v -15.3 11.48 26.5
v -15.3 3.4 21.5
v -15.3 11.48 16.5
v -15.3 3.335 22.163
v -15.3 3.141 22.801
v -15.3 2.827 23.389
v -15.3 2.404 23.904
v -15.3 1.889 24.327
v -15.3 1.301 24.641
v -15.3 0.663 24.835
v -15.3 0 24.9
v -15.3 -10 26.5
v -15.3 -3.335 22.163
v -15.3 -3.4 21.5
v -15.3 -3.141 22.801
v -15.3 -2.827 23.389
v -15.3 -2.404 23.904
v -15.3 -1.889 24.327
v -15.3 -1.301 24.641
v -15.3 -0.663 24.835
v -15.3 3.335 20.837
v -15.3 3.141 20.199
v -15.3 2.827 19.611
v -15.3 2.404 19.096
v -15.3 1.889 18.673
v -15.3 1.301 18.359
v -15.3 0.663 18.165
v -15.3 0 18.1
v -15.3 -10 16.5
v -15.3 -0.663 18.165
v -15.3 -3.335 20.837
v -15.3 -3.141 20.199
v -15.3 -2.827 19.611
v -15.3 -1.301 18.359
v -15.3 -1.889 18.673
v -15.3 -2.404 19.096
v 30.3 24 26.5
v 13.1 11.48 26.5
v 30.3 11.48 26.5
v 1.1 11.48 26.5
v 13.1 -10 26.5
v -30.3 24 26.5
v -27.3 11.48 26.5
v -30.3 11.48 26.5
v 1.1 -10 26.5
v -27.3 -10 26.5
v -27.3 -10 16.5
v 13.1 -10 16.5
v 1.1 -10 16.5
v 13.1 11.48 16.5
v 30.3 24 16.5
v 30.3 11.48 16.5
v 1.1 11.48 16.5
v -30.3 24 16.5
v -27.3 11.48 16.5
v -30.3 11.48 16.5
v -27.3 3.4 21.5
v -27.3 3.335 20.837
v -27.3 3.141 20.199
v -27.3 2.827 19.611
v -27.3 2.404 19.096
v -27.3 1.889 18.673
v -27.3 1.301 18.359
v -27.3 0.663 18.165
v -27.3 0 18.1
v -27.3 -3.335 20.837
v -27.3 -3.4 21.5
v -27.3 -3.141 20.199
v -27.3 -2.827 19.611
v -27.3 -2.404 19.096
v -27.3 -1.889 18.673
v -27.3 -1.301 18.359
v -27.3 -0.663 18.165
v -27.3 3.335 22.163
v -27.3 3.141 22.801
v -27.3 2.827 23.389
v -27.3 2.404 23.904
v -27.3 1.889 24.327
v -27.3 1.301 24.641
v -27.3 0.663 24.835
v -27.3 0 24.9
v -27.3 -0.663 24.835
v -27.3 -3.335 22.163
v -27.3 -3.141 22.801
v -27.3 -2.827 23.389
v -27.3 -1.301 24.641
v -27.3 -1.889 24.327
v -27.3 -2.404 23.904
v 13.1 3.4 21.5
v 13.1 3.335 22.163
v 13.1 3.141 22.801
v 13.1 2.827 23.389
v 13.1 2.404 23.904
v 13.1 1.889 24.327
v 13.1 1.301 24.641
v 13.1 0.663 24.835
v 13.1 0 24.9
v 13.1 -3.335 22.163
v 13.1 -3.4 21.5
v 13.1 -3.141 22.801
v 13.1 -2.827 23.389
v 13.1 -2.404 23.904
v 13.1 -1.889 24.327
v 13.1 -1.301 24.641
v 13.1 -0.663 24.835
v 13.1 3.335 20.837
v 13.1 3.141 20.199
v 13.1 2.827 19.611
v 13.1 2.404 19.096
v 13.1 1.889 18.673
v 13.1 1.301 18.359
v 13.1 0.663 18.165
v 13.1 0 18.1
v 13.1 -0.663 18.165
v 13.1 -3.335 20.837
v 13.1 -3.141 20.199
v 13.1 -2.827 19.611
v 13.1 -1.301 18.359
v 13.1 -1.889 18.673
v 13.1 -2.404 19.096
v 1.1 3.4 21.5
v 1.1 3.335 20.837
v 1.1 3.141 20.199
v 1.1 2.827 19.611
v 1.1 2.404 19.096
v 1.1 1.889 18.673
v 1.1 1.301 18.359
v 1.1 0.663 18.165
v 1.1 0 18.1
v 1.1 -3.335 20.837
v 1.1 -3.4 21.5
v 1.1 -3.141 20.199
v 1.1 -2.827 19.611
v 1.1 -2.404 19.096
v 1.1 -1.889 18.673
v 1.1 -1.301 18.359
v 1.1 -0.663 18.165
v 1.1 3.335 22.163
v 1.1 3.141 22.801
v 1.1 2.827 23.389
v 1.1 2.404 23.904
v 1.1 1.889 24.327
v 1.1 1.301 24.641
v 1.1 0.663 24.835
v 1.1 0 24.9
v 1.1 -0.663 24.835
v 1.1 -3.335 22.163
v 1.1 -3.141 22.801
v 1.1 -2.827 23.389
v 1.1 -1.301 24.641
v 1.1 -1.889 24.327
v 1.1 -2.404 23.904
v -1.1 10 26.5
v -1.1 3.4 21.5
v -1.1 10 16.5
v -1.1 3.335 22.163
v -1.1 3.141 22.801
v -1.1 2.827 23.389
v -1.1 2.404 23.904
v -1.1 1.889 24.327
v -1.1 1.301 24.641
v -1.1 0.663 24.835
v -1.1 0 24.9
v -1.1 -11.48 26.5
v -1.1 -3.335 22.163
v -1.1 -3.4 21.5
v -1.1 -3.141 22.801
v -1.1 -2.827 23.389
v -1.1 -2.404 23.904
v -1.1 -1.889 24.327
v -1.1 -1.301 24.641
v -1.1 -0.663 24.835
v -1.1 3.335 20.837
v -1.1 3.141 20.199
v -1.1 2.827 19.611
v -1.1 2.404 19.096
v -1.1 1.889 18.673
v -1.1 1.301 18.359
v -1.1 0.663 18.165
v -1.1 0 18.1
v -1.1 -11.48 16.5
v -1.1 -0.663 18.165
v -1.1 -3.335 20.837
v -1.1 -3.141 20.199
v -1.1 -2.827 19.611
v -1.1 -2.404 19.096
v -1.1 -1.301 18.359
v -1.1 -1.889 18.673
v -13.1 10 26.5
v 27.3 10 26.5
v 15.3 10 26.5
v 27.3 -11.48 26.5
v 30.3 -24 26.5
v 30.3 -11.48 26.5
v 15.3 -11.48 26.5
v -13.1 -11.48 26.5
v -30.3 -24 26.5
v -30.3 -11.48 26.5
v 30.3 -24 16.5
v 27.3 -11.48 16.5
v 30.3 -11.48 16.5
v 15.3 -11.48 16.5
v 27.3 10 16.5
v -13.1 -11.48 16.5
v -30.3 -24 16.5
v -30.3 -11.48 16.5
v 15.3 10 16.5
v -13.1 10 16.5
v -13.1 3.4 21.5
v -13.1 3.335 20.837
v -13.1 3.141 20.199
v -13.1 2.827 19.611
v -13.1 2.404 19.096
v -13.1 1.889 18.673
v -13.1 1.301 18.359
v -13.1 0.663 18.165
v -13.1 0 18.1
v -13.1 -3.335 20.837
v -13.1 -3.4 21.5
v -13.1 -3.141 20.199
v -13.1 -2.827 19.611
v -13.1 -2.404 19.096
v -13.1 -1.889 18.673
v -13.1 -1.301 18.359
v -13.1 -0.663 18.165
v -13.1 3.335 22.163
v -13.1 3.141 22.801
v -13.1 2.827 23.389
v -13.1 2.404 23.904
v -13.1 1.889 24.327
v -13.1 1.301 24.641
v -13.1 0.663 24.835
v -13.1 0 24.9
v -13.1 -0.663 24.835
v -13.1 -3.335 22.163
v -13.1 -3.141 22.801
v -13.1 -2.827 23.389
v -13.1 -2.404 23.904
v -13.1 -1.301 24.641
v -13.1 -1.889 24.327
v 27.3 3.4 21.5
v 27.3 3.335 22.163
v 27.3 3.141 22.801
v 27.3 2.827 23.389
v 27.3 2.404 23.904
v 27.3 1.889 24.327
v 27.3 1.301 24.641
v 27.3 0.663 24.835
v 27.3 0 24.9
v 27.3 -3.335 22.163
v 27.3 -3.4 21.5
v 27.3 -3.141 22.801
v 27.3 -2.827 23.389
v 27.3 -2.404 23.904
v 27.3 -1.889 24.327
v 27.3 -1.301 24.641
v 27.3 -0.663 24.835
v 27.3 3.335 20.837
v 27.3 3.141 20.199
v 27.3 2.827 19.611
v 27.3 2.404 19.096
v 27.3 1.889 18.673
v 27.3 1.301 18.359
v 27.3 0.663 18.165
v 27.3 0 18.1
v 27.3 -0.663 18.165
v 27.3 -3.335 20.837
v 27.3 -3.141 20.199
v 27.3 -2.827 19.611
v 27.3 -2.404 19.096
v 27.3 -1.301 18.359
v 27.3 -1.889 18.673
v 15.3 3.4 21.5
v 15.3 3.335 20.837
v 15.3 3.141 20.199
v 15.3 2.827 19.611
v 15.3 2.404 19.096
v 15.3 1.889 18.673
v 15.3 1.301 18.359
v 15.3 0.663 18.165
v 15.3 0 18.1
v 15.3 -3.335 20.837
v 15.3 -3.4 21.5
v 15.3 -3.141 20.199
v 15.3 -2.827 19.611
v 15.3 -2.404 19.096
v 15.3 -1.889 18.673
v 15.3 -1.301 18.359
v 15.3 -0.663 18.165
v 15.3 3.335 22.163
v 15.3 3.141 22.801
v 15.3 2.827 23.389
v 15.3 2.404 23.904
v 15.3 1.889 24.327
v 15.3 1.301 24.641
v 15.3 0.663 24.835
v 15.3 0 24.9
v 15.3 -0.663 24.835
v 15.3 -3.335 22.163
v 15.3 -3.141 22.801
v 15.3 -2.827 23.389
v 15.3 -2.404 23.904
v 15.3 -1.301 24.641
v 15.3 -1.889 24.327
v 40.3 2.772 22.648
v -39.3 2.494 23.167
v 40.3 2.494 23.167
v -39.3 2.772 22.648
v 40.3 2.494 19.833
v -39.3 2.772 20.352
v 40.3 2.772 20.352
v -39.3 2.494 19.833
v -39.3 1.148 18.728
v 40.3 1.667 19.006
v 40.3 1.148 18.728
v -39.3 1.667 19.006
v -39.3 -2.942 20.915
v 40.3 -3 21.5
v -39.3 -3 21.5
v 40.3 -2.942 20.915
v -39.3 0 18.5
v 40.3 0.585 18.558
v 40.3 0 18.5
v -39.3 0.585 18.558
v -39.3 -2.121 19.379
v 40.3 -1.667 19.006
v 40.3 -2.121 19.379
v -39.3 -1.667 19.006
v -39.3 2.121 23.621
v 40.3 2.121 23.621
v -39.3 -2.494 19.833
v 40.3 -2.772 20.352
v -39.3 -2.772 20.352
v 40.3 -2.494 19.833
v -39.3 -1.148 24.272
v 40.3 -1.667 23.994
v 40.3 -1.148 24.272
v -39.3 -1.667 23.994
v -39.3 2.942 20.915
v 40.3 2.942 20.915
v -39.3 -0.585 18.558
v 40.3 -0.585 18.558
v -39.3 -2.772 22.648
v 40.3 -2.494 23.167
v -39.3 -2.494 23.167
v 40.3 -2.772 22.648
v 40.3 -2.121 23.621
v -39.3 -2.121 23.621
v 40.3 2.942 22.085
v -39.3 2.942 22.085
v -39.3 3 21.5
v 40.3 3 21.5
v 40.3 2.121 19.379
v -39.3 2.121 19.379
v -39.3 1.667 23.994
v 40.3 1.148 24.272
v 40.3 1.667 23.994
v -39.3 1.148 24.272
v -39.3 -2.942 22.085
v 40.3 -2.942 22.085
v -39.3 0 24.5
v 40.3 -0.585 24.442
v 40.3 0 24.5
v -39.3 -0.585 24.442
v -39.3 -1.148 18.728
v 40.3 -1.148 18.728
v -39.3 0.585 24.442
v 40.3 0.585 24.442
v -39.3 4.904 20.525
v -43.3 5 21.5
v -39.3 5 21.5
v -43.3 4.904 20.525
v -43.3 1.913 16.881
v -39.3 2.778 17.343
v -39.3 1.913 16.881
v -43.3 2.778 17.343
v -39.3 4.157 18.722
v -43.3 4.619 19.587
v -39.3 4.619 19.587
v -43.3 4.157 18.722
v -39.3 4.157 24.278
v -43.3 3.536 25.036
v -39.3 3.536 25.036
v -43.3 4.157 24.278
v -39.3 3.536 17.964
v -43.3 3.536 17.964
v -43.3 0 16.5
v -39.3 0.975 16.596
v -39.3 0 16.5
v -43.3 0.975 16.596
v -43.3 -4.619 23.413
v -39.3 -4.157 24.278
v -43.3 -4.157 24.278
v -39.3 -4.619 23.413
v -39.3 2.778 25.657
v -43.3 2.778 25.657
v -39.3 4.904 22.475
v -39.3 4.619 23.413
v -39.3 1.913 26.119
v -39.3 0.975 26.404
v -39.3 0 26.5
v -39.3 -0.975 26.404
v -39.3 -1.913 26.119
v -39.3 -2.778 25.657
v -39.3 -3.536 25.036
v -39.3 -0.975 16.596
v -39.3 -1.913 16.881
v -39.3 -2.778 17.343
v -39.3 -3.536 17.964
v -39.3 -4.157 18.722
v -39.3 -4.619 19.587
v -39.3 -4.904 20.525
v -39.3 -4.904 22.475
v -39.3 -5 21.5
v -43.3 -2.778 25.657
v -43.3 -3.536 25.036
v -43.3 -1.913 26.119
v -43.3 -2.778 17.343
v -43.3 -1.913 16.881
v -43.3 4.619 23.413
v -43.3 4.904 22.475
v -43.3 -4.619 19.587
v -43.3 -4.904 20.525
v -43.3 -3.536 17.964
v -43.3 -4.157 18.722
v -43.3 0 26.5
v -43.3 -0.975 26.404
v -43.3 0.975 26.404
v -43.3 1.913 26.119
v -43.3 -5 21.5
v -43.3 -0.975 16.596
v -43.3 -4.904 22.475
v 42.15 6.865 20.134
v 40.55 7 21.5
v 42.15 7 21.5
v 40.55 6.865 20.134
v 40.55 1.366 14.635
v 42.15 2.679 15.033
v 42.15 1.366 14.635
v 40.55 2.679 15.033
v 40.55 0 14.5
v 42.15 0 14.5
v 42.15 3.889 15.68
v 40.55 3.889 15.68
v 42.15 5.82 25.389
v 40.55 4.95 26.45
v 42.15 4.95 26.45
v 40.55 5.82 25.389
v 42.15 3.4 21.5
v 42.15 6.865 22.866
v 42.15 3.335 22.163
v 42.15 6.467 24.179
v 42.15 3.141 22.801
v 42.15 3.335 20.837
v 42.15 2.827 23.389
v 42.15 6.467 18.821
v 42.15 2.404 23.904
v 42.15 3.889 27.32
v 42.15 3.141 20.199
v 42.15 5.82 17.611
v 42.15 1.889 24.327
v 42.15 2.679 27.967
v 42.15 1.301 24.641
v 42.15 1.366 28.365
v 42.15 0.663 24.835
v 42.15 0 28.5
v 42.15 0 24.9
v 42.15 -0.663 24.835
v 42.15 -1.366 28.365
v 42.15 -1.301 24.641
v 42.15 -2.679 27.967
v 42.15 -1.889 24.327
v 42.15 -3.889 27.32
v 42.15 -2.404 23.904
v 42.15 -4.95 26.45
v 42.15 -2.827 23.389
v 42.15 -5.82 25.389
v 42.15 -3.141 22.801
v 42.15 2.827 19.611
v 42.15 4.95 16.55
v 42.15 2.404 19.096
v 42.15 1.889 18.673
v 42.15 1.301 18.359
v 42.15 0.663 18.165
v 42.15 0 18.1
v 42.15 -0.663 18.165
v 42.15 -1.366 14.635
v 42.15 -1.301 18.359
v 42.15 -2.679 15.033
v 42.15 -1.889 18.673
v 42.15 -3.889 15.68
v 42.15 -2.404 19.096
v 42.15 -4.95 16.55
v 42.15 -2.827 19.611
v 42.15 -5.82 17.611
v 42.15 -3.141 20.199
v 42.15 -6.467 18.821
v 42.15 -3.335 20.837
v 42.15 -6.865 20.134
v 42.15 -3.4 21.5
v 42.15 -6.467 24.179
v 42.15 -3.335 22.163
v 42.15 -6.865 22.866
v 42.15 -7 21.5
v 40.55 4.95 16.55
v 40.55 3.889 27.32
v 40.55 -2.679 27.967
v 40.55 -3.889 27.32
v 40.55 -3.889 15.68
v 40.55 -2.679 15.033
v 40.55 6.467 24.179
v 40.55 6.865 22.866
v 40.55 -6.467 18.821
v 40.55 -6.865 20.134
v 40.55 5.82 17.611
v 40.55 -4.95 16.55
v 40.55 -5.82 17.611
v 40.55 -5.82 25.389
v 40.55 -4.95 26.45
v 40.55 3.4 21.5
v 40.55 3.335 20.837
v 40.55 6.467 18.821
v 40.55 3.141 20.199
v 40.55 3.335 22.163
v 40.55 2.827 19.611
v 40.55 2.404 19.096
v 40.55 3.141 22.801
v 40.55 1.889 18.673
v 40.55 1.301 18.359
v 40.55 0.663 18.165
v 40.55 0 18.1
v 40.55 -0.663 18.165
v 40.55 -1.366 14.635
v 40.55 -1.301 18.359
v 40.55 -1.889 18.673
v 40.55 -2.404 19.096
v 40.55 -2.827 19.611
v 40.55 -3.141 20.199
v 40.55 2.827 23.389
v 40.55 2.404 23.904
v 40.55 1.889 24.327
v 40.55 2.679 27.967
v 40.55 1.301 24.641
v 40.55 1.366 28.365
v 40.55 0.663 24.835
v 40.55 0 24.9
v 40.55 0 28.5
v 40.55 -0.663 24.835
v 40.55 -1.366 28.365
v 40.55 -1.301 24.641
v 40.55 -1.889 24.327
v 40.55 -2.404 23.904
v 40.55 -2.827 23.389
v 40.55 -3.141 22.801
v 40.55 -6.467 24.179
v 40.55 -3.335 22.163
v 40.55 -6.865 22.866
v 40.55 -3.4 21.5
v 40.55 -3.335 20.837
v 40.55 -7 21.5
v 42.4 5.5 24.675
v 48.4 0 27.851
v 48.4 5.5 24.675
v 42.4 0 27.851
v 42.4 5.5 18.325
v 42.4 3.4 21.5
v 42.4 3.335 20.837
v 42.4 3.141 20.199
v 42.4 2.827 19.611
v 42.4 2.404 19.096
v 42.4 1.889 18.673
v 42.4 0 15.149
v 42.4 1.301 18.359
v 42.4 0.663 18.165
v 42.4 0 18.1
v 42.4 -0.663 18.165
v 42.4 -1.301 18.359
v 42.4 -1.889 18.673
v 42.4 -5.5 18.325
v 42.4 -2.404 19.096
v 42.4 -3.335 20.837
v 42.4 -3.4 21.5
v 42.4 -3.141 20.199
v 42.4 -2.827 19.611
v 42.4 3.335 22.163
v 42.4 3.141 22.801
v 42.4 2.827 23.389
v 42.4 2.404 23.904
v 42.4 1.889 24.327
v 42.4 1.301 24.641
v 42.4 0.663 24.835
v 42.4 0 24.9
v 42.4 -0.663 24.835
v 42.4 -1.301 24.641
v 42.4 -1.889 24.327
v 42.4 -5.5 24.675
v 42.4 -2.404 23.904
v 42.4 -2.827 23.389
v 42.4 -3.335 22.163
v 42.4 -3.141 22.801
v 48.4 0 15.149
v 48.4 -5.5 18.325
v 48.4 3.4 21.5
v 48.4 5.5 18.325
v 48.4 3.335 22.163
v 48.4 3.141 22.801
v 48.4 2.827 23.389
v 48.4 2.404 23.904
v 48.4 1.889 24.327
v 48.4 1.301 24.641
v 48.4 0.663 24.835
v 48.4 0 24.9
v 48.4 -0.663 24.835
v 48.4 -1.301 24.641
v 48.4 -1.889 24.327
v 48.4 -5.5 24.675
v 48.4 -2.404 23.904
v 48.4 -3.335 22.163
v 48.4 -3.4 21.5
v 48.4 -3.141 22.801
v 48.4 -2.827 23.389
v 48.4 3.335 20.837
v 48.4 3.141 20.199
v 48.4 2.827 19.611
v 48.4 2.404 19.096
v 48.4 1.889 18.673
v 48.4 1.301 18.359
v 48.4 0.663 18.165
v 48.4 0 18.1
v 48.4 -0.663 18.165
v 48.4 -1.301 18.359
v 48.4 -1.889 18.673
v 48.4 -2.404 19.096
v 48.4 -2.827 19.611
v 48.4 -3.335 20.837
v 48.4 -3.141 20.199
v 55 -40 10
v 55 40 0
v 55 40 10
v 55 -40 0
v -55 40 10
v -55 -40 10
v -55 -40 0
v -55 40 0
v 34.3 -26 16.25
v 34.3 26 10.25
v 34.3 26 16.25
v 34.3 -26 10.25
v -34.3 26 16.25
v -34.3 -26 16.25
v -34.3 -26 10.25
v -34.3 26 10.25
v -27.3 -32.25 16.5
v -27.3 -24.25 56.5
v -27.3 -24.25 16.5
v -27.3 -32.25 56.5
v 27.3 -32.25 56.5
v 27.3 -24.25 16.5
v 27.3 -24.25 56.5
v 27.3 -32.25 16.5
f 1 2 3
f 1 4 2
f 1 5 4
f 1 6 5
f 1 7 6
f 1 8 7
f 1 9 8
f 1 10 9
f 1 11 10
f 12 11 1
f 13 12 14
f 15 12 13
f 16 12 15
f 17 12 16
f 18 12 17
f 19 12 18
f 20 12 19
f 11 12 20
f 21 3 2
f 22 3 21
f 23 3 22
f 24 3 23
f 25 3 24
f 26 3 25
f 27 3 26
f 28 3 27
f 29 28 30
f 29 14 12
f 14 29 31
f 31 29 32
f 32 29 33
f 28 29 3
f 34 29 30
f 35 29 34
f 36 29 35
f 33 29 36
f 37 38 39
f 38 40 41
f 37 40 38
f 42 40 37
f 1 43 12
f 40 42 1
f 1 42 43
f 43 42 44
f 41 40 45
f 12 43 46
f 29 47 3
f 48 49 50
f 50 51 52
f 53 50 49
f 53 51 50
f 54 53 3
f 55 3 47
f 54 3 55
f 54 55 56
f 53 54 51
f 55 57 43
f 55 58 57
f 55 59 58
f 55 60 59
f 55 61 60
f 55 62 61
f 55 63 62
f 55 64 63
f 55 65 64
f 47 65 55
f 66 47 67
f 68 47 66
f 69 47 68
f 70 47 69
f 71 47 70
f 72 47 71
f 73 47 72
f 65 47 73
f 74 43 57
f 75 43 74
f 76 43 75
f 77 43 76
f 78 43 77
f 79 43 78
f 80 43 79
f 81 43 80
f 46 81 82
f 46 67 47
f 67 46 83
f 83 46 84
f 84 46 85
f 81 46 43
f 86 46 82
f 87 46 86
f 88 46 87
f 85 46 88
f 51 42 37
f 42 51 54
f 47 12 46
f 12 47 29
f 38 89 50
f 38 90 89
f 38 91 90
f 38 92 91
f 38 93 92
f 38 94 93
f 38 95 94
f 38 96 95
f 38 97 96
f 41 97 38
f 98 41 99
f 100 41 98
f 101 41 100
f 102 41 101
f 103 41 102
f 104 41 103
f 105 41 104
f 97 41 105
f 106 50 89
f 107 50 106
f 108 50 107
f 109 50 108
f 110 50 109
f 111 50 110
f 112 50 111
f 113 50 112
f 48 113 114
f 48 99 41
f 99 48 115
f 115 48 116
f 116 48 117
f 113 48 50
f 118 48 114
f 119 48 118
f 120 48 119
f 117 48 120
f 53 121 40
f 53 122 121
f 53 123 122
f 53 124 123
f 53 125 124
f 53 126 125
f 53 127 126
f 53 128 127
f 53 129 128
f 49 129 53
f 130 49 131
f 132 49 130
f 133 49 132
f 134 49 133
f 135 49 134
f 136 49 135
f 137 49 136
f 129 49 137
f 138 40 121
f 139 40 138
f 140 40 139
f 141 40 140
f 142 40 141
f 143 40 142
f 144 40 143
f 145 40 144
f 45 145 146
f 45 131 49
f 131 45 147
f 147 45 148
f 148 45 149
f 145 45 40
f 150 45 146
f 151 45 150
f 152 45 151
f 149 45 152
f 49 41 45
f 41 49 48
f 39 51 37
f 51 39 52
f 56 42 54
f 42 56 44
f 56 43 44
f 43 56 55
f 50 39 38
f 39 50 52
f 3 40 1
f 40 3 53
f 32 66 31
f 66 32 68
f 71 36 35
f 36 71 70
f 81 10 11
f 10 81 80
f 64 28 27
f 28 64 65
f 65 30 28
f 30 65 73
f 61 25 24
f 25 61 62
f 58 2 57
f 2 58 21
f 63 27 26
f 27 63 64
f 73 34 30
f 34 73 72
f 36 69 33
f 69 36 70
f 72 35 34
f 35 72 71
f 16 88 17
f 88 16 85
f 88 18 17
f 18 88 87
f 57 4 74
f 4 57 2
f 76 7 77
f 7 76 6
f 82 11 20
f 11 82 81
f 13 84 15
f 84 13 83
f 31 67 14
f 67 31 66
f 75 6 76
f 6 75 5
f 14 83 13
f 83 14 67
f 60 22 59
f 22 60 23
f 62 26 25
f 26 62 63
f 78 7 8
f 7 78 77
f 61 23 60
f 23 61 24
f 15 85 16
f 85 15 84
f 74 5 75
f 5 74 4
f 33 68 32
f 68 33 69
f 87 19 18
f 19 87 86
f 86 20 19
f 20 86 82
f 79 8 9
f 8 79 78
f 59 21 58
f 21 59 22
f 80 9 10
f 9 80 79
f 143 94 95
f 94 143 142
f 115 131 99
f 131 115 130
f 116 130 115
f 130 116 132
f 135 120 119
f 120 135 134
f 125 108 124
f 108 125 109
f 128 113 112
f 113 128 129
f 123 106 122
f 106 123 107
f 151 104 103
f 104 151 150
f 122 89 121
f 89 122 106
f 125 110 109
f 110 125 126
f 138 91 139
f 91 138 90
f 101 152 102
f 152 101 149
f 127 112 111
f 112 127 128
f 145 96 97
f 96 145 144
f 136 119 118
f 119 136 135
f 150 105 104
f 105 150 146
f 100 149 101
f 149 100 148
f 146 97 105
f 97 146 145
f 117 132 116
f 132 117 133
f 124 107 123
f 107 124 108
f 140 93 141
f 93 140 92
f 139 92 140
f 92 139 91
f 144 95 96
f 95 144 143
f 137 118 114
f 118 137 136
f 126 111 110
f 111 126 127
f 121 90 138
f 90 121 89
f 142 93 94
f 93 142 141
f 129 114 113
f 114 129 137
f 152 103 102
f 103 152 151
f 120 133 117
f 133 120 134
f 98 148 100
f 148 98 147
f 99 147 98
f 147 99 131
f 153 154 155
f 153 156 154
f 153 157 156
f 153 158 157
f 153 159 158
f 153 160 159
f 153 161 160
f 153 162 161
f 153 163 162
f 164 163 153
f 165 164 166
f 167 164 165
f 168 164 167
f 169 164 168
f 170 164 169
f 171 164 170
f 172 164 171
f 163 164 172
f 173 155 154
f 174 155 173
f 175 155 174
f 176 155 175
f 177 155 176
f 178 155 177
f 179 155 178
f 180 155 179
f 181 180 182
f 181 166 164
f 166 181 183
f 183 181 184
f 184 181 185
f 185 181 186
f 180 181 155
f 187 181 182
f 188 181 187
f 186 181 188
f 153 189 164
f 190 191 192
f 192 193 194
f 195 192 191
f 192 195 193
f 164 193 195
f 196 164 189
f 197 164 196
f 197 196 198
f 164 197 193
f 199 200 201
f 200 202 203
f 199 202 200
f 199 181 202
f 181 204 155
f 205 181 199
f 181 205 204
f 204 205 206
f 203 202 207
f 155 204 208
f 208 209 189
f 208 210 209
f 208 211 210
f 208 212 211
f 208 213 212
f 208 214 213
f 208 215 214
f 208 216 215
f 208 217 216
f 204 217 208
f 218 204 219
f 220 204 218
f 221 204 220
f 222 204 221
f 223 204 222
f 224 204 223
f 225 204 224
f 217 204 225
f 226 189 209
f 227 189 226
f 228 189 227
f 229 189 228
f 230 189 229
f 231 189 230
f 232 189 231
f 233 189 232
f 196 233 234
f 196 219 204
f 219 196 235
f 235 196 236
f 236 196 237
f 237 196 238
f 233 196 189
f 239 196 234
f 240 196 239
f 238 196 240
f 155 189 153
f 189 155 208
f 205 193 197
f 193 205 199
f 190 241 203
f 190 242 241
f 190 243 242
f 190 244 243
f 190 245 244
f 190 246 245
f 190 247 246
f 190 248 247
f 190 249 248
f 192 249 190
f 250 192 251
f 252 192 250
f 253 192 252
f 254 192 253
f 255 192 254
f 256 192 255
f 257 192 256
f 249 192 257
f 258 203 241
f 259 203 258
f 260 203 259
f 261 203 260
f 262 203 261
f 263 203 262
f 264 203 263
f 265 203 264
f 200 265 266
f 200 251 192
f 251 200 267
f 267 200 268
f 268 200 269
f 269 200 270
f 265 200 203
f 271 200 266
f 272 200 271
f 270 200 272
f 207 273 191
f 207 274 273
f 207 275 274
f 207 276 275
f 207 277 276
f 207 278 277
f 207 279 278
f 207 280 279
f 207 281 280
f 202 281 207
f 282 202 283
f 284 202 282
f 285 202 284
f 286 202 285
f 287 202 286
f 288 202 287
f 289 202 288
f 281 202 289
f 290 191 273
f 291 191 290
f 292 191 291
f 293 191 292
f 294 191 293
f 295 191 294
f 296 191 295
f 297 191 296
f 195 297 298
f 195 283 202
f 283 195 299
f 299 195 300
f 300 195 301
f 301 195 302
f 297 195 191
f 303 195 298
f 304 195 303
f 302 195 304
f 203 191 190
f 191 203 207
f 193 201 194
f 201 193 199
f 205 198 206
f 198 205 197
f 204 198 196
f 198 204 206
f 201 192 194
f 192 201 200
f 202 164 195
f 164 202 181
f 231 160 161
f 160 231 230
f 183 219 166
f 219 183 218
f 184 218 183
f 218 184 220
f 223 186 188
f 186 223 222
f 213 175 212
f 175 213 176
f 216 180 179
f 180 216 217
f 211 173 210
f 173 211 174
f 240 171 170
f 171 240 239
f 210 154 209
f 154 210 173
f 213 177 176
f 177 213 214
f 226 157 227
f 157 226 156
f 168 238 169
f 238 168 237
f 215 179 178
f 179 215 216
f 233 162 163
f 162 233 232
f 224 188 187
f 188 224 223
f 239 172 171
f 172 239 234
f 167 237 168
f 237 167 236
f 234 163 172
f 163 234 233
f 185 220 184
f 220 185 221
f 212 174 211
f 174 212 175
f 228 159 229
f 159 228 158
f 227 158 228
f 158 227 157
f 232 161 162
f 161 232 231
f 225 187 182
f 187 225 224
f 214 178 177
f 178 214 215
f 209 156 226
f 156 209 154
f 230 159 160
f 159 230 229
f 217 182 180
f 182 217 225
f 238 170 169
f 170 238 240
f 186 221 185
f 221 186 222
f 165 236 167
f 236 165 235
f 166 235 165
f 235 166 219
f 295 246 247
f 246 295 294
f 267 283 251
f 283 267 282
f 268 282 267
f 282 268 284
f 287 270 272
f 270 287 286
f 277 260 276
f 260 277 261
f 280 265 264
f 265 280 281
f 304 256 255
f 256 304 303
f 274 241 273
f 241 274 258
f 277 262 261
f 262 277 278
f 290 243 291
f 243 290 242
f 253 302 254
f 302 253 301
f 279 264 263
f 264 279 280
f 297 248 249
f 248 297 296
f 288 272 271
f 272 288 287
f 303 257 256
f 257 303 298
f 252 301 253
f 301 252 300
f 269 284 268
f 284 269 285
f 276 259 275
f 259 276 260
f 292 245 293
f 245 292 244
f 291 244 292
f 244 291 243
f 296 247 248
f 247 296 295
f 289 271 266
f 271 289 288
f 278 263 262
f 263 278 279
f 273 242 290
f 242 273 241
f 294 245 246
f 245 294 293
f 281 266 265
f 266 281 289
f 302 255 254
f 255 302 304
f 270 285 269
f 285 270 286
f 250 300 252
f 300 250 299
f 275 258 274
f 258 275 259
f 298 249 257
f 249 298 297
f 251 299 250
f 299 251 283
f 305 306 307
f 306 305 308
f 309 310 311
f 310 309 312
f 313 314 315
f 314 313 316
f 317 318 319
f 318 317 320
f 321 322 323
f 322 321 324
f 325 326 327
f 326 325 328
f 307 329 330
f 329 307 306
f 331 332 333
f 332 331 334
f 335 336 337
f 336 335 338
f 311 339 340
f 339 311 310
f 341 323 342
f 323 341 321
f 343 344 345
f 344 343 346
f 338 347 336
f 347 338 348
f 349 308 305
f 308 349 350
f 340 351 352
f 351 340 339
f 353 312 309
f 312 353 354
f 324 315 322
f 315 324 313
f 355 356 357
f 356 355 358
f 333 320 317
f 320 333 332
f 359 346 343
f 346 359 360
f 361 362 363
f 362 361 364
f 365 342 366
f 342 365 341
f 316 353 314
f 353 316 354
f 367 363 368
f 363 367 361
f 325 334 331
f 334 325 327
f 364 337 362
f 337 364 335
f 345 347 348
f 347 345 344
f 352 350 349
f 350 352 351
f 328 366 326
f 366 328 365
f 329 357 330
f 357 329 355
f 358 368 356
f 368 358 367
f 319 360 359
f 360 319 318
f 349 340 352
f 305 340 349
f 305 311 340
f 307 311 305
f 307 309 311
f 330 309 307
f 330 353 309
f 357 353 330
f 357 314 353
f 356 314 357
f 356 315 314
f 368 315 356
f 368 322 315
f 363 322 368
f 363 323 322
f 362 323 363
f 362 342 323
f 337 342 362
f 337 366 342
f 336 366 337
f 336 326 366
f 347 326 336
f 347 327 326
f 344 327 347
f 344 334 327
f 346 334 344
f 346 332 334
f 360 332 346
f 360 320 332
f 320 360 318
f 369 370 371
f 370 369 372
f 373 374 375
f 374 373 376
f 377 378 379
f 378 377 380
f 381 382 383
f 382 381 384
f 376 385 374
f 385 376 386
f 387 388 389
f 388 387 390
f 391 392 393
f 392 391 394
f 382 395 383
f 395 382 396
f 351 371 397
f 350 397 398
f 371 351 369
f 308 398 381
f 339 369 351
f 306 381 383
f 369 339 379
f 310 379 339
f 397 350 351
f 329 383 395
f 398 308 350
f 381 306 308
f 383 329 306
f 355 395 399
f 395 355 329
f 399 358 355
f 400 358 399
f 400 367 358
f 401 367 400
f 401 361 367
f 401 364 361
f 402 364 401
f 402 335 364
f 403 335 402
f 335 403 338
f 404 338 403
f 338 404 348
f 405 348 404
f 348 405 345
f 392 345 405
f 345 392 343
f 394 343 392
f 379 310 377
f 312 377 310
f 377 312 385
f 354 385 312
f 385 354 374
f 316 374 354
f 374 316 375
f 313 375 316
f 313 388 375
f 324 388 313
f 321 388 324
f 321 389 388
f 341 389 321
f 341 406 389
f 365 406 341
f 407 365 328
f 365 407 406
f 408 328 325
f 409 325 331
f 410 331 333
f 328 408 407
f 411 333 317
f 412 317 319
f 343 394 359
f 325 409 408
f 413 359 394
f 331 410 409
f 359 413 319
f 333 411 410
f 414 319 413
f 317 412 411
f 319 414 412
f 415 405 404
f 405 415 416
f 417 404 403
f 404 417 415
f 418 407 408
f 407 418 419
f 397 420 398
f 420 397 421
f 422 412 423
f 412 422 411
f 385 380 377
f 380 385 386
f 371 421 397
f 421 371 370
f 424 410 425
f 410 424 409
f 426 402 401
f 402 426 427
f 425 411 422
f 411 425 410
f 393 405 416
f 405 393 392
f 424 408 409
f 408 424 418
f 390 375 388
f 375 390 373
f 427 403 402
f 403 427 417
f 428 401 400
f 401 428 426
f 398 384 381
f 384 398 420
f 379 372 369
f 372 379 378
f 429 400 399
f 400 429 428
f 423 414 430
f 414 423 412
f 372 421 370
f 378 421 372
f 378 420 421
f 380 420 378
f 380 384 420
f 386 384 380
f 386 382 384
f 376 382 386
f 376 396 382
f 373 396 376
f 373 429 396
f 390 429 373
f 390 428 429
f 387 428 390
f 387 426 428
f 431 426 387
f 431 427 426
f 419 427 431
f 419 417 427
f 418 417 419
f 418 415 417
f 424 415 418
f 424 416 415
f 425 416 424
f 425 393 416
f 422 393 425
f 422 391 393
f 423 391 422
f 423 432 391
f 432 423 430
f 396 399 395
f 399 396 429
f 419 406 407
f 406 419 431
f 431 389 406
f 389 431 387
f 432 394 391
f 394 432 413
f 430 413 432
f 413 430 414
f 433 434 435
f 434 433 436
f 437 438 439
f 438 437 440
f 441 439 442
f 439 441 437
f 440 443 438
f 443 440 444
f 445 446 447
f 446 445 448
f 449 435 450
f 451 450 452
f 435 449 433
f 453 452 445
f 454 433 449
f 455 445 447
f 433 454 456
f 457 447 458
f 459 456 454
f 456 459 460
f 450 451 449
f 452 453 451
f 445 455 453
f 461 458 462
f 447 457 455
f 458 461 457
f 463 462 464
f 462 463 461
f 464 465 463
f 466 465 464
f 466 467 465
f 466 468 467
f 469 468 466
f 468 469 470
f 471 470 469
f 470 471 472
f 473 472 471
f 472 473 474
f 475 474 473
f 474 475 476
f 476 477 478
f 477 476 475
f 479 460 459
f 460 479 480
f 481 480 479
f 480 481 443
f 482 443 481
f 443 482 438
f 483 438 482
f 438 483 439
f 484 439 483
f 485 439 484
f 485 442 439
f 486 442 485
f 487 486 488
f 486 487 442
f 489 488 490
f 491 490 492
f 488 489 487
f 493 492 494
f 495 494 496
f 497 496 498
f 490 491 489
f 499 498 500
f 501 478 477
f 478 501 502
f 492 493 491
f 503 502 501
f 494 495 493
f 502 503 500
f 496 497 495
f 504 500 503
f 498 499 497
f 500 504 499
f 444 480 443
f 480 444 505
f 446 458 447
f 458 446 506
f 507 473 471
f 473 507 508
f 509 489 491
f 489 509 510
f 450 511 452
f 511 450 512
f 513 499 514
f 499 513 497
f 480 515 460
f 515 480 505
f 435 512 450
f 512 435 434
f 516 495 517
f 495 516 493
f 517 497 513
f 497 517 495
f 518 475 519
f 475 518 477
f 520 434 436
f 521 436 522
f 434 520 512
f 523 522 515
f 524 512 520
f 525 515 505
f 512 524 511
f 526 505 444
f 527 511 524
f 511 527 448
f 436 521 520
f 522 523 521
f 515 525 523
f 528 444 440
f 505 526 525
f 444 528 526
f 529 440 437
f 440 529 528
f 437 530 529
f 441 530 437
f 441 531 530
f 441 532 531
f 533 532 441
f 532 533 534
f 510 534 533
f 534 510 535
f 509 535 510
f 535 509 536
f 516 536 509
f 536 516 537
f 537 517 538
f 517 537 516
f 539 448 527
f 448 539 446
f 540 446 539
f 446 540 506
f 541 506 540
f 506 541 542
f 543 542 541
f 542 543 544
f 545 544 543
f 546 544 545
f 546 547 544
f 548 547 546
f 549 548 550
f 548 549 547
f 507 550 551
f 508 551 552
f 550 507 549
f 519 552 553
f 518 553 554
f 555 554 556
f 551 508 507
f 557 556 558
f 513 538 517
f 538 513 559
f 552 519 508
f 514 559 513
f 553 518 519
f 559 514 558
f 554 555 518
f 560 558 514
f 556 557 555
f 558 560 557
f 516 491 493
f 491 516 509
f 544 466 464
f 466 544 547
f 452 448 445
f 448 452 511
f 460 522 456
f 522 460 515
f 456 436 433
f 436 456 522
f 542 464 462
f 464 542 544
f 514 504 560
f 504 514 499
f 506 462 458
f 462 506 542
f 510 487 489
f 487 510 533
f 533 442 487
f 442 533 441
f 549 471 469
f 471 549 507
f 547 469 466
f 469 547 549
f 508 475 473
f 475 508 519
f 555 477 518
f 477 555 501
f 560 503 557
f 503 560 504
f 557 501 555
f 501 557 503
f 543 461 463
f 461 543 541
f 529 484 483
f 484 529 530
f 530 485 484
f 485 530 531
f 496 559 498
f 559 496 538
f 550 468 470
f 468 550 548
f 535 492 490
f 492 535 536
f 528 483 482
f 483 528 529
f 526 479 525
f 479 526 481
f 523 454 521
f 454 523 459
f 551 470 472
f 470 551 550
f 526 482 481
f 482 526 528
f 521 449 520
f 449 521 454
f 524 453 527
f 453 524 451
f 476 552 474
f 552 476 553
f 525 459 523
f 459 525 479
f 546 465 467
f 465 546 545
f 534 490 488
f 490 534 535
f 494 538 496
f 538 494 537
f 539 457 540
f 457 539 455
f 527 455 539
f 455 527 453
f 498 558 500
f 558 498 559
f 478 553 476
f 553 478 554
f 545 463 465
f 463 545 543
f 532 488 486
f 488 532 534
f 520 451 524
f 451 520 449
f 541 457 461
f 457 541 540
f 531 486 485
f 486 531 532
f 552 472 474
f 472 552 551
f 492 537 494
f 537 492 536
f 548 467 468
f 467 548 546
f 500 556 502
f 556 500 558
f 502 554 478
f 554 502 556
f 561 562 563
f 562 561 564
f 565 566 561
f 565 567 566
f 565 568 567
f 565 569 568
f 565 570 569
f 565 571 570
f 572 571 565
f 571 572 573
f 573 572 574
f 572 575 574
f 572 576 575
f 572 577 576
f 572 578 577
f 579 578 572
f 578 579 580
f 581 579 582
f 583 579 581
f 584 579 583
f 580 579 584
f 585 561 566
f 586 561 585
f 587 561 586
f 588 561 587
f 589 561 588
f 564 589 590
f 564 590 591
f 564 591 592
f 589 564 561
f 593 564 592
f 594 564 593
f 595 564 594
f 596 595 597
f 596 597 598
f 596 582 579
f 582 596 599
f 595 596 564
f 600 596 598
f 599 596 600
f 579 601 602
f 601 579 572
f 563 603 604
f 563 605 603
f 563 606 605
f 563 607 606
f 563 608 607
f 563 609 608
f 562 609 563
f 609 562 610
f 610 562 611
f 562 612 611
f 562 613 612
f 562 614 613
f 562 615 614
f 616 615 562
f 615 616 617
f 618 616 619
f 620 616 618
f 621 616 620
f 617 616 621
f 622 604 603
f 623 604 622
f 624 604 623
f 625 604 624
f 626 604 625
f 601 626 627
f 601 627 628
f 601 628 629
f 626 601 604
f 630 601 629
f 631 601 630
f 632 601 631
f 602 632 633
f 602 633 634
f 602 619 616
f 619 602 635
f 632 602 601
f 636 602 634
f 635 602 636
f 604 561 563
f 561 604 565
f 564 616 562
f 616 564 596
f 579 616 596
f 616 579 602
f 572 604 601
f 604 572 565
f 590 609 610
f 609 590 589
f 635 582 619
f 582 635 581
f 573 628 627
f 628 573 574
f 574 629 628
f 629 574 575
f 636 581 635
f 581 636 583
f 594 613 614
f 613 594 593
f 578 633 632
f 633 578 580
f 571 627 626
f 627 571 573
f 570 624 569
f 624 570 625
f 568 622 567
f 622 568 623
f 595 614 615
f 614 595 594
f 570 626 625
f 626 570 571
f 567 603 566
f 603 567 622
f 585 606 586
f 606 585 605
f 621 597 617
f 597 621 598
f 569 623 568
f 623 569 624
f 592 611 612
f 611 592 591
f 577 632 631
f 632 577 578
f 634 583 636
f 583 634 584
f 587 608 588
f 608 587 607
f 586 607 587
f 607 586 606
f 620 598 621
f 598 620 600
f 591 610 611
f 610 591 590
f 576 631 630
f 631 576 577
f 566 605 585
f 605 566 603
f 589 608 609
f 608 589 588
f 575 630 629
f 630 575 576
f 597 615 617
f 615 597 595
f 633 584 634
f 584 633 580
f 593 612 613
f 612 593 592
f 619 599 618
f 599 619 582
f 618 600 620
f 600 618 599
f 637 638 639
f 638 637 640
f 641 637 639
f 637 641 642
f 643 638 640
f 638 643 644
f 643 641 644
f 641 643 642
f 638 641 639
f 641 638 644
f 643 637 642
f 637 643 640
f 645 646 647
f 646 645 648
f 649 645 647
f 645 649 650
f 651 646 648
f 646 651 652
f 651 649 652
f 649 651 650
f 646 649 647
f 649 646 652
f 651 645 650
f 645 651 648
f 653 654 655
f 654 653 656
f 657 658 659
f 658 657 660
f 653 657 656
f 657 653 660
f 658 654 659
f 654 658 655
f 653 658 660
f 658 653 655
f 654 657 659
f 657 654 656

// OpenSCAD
$fn = 32;

// ------------------------------------------------------------------------
// Comb hinge with flap: leaf 60.6 x 24 mm, pin d6, flap 40 mm
// Every part is its own module, assembly() places every instance.
// ------------------------------------------------------------------------

// --- part 1 ---
module hinge_bed() {
  difference() {
    translate([-55, -40, 0]) cube([110, 80, 10]);
  }
}

// --- part 2 ---
module hinge_riser() {
  difference() {
    translate([-34.3, -26, 0]) cube([68.6, 52, 6]);
  }
}

// --- part 3 ---
module hinge_leaf_a() {
  difference() {
    union() {
      translate([-27.3, -10, -5]) cube([12, 34, 10]);
      translate([1.1, -10, -5]) cube([12, 34, 10]);
      translate([-30.3, 11.48, -5]) cube([60.6, 12.52, 10]);
    }
    translate([-21.3, 0, 0]) rotate([0, 90, 0]) cylinder(h = 14, d = 6.8, center = true);
    translate([7.1, 0, 0]) rotate([0, 90, 0]) cylinder(h = 14, d = 6.8, center = true);
  }
}

// --- part 4 ---
module hinge_leaf_b() {
  difference() {
    union() {
      translate([-13.1, -24, -5]) cube([12, 34, 10]);
      translate([15.3, -24, -5]) cube([12, 34, 10]);
      translate([-30.3, -24, -5]) cube([60.6, 12.52, 10]);
    }
    translate([-7.1, 0, 0]) rotate([0, 90, 0]) cylinder(h = 14, d = 6.8, center = true);
    translate([21.3, 0, 0]) rotate([0, 90, 0]) cylinder(h = 14, d = 6.8, center = true);
  }
}

// --- part 5 ---
module hinge_flap() {
  difference() {
    translate([-27.3, -20, 0]) cube([54.6, 40, 8]);
  }
}

// --- part 6 ---
module hinge_pin() {
  rotate([0, 90, 0]) cylinder(h = 80.6, d = 6, center = true);
  translate([-43.3, 0, 0]) rotate([0, 90, 0]) cylinder(h = 4, d = 10);
}

// --- part 7 ---
module pin_washer() {
  difference() {
      translate([0, 0, 0]) cylinder(h = 1.6, d = 14);
      translate([0, 0, -1]) cylinder(h = 3.6, d = 6.8);
    }
}

// --- part 8 ---
module pin_nut() {
  difference() {
    linear_extrude(height = 6) polygon(points = [[6.351, 0], [3.175, 5.5], [-3.175, 5.5], [-6.351, 0], [-3.175, -5.5], [3.175, -5.5]]);
    translate([0, 0, -1]) cylinder(h = 8, d = 6.8);
  }
}

// --- assembly ---
module assembly() {
  color([0.80, 0.24, 0.20]) translate([0, 0, 0]) rotate([0, 0, 0]) hinge_bed();
  color([0.20, 0.45, 0.75]) translate([0, 0, 10.25]) rotate([0, 0, 0]) hinge_riser();
  color([0.25, 0.62, 0.32]) translate([0, 0, 21.5]) rotate([0, 0, 0]) hinge_leaf_a();
  color([0.92, 0.70, 0.18]) translate([0, 0, 21.5]) rotate([0, 0, 0]) hinge_leaf_b();
  color([0.58, 0.35, 0.70]) translate([0, -24.25, 36.5]) rotate([90, 0, 0]) hinge_flap();
  color([0.16, 0.66, 0.66]) translate([0, 0, 21.5]) rotate([0, 0, 0]) hinge_pin();
  color([0.85, 0.48, 0.18]) translate([40.55, 0, 21.5]) rotate([0, 90, 0]) pin_washer();
  color([0.55, 0.60, 0.65]) translate([42.4, 0, 21.5]) rotate([0, 90, 0]) pin_nut();
}

assembly();
